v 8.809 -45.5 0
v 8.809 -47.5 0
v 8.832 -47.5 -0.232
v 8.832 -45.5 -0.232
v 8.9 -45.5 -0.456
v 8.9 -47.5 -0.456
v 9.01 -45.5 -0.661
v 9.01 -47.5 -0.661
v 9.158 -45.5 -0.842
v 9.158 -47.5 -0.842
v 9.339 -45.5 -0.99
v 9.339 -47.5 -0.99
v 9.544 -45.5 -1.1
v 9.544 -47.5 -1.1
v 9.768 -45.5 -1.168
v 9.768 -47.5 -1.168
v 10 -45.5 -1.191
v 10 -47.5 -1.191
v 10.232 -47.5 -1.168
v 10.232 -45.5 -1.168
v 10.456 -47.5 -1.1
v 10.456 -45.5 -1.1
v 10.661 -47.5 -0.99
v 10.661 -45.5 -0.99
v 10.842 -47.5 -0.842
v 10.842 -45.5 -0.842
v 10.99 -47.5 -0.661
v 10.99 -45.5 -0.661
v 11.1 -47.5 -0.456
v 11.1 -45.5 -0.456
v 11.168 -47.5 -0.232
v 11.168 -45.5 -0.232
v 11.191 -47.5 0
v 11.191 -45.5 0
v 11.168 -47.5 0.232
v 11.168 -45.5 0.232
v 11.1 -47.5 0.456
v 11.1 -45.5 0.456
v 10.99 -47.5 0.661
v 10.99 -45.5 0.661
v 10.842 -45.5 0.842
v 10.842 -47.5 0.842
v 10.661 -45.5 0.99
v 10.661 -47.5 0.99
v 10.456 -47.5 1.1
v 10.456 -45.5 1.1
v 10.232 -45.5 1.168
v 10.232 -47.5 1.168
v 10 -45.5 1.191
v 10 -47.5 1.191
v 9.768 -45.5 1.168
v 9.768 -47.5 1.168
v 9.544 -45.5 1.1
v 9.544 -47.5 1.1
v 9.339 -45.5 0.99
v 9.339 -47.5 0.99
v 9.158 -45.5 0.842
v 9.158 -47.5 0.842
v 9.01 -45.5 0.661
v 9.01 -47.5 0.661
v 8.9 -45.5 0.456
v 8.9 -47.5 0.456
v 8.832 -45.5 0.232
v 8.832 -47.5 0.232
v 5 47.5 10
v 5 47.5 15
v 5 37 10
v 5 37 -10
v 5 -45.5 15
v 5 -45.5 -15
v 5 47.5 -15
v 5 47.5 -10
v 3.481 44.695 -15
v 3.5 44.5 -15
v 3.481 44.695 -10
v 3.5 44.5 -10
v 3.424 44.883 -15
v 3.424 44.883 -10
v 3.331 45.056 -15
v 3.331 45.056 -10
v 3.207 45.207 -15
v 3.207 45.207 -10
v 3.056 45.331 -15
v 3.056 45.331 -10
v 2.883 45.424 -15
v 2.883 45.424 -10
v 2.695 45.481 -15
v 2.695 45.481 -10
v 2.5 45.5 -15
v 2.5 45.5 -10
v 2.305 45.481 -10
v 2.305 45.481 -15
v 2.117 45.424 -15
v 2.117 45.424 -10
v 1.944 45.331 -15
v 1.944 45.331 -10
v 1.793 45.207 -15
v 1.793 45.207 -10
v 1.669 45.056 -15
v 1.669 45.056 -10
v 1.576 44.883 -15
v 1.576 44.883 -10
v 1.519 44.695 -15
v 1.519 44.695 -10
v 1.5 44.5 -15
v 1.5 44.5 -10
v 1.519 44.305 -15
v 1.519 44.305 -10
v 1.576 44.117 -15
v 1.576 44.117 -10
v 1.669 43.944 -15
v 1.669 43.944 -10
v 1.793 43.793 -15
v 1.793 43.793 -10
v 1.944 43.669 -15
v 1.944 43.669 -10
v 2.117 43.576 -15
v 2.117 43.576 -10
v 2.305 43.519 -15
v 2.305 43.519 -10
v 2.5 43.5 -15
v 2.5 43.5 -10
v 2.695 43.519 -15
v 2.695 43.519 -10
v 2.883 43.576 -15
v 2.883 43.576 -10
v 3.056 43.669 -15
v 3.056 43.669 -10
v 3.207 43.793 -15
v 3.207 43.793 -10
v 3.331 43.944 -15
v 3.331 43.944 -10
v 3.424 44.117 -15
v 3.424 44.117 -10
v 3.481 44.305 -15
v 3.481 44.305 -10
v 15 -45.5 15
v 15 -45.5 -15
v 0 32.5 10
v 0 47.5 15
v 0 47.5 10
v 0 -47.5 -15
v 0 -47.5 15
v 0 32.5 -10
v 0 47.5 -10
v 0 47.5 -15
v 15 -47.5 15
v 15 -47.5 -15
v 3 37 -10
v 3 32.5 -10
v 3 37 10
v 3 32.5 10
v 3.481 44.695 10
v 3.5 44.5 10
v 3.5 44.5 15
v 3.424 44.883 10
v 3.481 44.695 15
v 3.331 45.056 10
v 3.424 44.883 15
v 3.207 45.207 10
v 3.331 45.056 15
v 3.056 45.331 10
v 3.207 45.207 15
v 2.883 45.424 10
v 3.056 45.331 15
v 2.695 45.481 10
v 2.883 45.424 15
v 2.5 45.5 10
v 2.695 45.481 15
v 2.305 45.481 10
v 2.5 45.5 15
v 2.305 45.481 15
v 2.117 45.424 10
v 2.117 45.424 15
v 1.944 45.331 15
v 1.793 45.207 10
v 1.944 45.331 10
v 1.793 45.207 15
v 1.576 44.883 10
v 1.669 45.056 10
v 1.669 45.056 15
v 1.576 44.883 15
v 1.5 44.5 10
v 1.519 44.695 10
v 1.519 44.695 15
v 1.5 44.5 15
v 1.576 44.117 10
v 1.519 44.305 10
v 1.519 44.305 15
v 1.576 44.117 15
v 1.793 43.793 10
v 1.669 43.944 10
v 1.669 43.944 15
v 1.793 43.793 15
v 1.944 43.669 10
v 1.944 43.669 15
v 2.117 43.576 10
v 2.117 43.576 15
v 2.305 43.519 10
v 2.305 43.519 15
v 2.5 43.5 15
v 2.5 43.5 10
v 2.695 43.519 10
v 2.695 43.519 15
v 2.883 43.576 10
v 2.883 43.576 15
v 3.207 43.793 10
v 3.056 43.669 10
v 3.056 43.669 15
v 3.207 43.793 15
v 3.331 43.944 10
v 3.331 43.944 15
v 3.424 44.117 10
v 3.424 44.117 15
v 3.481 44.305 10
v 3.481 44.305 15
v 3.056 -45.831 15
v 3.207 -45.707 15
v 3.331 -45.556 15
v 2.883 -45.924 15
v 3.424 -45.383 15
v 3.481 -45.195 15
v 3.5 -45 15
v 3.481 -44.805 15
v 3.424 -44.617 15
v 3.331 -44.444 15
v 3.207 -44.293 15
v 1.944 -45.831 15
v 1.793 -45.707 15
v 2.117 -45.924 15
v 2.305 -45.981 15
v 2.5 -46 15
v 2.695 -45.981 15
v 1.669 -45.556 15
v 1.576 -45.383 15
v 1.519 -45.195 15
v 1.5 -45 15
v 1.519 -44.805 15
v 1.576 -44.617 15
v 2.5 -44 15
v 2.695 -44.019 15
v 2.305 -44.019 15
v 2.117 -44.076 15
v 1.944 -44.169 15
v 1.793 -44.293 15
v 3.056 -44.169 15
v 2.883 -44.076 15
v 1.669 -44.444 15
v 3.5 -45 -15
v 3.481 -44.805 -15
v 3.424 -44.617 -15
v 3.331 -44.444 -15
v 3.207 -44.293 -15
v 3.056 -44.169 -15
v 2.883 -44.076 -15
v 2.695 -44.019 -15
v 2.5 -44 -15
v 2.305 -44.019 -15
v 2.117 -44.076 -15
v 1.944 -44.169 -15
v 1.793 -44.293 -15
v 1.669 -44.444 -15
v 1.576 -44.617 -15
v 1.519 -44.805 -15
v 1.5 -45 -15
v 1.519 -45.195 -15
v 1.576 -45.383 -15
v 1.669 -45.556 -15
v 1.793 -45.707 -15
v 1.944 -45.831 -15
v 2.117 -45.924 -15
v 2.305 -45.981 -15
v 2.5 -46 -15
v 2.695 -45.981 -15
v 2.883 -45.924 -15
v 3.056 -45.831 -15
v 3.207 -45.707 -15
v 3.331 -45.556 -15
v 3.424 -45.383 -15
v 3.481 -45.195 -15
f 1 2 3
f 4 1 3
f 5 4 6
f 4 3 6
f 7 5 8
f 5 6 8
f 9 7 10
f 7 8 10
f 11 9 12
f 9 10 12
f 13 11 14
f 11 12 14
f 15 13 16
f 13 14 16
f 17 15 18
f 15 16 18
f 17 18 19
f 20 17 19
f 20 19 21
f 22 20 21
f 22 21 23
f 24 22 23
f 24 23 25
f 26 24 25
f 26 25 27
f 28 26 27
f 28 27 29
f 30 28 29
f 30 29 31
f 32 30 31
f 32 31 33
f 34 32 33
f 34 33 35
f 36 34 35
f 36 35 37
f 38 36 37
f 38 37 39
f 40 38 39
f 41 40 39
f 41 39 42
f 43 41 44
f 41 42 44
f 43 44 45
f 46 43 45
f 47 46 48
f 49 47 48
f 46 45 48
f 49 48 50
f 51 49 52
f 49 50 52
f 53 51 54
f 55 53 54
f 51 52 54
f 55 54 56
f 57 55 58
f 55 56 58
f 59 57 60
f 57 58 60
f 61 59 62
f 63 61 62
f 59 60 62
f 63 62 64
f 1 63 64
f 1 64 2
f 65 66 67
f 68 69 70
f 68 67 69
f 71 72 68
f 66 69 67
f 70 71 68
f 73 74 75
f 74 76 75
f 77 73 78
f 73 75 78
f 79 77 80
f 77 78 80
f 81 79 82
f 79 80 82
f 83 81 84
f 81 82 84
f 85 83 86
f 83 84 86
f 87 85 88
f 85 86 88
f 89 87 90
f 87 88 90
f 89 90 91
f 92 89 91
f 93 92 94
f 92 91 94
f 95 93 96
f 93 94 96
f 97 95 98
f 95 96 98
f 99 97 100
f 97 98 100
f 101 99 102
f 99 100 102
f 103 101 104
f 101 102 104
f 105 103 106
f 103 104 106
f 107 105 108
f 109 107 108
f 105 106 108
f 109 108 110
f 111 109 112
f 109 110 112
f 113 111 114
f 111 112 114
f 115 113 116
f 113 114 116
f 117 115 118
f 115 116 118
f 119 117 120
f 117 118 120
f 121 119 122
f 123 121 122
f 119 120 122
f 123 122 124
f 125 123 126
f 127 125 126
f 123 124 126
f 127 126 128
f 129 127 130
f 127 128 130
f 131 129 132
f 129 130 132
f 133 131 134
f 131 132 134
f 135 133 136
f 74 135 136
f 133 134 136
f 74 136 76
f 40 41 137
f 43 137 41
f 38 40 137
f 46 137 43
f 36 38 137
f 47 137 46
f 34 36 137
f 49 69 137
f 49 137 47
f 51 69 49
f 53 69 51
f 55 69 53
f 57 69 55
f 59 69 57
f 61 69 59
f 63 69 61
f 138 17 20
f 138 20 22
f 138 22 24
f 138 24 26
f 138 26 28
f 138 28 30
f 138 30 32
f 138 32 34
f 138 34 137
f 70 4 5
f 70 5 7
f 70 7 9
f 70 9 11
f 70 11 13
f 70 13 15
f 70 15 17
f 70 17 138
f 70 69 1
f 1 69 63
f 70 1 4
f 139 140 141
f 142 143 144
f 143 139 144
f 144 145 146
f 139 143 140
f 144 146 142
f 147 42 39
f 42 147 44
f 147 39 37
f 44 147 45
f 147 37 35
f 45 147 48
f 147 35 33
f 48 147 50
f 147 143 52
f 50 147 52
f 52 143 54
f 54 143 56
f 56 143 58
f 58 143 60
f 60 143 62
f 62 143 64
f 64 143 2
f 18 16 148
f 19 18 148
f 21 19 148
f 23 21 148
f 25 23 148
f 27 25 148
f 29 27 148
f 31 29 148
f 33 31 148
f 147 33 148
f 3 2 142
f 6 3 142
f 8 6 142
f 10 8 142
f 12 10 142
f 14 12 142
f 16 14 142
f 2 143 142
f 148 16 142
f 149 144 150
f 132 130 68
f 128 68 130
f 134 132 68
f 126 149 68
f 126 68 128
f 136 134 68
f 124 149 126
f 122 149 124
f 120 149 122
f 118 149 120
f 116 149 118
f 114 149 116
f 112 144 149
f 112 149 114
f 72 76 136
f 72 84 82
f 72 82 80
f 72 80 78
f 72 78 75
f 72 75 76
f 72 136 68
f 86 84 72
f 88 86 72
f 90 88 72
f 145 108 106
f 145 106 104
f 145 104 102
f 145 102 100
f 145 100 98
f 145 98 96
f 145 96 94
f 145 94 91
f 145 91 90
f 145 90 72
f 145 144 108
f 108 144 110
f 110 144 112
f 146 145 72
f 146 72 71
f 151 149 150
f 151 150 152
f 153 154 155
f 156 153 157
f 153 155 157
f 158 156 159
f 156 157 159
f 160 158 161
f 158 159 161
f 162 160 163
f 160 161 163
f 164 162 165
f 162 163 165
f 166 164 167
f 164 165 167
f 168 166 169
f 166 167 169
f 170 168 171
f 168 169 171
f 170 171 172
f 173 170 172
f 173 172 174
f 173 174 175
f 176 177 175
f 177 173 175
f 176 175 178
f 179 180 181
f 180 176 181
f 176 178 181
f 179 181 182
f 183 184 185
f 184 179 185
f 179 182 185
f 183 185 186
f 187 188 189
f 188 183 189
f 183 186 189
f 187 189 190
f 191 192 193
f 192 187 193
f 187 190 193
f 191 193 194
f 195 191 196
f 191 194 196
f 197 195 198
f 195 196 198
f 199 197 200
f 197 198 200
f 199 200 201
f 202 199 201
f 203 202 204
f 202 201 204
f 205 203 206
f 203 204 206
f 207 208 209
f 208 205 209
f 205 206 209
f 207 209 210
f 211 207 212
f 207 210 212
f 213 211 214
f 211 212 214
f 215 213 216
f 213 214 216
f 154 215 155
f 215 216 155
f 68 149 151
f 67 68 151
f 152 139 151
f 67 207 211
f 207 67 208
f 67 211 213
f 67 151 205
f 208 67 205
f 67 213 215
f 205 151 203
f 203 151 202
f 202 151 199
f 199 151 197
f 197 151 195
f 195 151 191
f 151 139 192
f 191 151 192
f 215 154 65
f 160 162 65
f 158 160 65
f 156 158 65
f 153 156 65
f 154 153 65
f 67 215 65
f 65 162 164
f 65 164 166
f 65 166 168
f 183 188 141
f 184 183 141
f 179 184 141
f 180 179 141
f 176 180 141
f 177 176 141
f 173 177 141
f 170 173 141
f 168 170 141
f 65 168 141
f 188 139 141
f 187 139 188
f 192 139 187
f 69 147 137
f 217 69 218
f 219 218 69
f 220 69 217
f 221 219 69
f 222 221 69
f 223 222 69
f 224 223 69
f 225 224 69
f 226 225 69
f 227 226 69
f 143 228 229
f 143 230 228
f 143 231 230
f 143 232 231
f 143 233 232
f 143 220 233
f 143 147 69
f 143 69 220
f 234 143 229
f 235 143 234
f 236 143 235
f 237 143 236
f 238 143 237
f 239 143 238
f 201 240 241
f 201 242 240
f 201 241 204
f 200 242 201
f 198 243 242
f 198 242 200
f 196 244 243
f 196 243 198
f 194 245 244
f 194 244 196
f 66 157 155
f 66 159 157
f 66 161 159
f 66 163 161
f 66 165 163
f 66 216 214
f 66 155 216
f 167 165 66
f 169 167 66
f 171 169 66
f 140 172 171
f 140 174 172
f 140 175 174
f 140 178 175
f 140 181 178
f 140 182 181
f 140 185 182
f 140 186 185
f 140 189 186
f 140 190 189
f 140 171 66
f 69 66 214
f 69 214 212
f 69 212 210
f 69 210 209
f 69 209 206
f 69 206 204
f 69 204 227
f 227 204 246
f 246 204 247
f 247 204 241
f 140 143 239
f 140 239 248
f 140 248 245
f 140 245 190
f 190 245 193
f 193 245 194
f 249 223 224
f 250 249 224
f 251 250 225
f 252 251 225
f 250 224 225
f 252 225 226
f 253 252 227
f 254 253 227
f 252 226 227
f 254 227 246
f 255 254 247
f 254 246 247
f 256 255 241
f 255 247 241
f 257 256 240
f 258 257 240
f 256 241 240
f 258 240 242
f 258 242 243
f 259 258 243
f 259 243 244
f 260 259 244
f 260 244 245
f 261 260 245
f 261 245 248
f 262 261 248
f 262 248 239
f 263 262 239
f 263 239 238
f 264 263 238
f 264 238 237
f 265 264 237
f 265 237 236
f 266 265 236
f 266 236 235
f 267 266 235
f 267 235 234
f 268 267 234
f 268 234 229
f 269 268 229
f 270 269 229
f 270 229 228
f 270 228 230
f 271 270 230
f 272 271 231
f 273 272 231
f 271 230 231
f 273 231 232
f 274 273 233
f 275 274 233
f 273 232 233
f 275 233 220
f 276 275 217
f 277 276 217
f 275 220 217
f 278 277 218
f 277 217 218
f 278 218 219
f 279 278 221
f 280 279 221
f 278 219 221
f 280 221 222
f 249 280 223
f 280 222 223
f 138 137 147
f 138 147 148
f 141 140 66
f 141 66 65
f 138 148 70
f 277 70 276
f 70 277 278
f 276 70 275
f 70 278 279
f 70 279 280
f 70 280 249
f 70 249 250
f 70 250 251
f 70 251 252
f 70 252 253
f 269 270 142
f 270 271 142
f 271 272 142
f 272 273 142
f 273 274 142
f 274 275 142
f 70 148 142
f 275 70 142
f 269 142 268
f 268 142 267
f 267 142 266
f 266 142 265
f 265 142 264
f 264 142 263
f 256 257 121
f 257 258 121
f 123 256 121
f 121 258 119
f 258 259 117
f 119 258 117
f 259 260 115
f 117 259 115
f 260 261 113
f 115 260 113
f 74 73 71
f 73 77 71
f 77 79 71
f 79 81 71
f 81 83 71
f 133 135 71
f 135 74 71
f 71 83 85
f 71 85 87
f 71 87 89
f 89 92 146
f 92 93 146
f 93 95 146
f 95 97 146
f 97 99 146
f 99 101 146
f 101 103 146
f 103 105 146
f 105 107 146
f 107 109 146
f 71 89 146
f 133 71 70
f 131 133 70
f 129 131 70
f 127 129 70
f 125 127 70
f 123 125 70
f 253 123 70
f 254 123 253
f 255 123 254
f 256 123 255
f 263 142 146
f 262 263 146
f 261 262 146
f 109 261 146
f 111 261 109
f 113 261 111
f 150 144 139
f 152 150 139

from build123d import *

# Parameters (mm, degrees)
SKETCH2_W                       = 30
SKETCH2_H                       = 95
BOSS_EXTRUDE1_DEPTH             = 5
F_2MM_DIAMETER_HOLE_D           = 2
SKETCH6_W                       = 30
SKETCH6_H                       = 2
BOSS_EXTRUDE2_DEPTH             = 10
F_3_32_0_09375_DIAMETER_HOLE2_D = 2.38125
SKETCH10_W                      = 20
SKETCH10_H                      = 15
CUT_EXTRUDE3_DEPTH              = 3
SKETCH11_W                      = 20
SKETCH11_H                      = 10.5
CUT_EXTRUDE4_DEPTH              = 52.237193522
F_2MM_DIAMETER_HOLE2_D          = 2


with BuildPart() as part:
    # Sketch2 → Boss-Extrude1 (new body)
    with BuildSketch(Plane(origin=(0, 0, 0), x_dir=(0, 0, -1), z_dir=(1, 0, 0))):
        Rectangle(SKETCH2_W, SKETCH2_H)
    extrude(amount=BOSS_EXTRUDE1_DEPTH)

    # 2mm Diameter Hole (through all)
    with Locations(Plane(origin=(0, 0, -15), x_dir=(-1, 0, 0), z_dir=(0, 0, -1))):
        with Locations((-2.5, 44.5)):
            Hole(F_2MM_DIAMETER_HOLE_D / 2)

    # Sketch6 → Boss-Extrude2 (add)
    with BuildSketch(Plane(origin=(5, 0, 0), x_dir=(0, 0, -1), z_dir=(1, 0, 0))):
        with Locations((0, -46.5)):
            Rectangle(SKETCH6_W, SKETCH6_H)
    extrude(amount=BOSS_EXTRUDE2_DEPTH)

    # 3/32 (0.09375) Diameter Hole2 (through all)
    with Locations(Plane(origin=(0, -45.5, 0), x_dir=(1, 0, 0), z_dir=(0, 1, 0))):
        with Locations((10, 0)):
            Hole(F_3_32_0_09375_DIAMETER_HOLE2_D / 2)

    # Sketch10 → Cut-Extrude3 (cut)
    with BuildSketch(Plane.ZY):
        with Locations((0, 40)):
            Rectangle(SKETCH10_W, SKETCH10_H)
    extrude(amount=-CUT_EXTRUDE3_DEPTH, mode=Mode.SUBTRACT)

    # Sketch11 → Cut-Extrude4 (cut, through all)
    with BuildSketch(Plane.ZY.offset(-3)):
        with Locations((0, 42.25)):
            Rectangle(SKETCH11_W, SKETCH11_H)
    extrude(amount=-CUT_EXTRUDE4_DEPTH, mode=Mode.SUBTRACT)

    # 2mm Diameter Hole2 (through all)
    with Locations(Plane(origin=(0, 0, -15), x_dir=(-1, 0, 0), z_dir=(0, 0, -1))):
        with Locations((-2.5, -45)):
            Hole(F_2MM_DIAMETER_HOLE2_D / 2)


solid = part.part
